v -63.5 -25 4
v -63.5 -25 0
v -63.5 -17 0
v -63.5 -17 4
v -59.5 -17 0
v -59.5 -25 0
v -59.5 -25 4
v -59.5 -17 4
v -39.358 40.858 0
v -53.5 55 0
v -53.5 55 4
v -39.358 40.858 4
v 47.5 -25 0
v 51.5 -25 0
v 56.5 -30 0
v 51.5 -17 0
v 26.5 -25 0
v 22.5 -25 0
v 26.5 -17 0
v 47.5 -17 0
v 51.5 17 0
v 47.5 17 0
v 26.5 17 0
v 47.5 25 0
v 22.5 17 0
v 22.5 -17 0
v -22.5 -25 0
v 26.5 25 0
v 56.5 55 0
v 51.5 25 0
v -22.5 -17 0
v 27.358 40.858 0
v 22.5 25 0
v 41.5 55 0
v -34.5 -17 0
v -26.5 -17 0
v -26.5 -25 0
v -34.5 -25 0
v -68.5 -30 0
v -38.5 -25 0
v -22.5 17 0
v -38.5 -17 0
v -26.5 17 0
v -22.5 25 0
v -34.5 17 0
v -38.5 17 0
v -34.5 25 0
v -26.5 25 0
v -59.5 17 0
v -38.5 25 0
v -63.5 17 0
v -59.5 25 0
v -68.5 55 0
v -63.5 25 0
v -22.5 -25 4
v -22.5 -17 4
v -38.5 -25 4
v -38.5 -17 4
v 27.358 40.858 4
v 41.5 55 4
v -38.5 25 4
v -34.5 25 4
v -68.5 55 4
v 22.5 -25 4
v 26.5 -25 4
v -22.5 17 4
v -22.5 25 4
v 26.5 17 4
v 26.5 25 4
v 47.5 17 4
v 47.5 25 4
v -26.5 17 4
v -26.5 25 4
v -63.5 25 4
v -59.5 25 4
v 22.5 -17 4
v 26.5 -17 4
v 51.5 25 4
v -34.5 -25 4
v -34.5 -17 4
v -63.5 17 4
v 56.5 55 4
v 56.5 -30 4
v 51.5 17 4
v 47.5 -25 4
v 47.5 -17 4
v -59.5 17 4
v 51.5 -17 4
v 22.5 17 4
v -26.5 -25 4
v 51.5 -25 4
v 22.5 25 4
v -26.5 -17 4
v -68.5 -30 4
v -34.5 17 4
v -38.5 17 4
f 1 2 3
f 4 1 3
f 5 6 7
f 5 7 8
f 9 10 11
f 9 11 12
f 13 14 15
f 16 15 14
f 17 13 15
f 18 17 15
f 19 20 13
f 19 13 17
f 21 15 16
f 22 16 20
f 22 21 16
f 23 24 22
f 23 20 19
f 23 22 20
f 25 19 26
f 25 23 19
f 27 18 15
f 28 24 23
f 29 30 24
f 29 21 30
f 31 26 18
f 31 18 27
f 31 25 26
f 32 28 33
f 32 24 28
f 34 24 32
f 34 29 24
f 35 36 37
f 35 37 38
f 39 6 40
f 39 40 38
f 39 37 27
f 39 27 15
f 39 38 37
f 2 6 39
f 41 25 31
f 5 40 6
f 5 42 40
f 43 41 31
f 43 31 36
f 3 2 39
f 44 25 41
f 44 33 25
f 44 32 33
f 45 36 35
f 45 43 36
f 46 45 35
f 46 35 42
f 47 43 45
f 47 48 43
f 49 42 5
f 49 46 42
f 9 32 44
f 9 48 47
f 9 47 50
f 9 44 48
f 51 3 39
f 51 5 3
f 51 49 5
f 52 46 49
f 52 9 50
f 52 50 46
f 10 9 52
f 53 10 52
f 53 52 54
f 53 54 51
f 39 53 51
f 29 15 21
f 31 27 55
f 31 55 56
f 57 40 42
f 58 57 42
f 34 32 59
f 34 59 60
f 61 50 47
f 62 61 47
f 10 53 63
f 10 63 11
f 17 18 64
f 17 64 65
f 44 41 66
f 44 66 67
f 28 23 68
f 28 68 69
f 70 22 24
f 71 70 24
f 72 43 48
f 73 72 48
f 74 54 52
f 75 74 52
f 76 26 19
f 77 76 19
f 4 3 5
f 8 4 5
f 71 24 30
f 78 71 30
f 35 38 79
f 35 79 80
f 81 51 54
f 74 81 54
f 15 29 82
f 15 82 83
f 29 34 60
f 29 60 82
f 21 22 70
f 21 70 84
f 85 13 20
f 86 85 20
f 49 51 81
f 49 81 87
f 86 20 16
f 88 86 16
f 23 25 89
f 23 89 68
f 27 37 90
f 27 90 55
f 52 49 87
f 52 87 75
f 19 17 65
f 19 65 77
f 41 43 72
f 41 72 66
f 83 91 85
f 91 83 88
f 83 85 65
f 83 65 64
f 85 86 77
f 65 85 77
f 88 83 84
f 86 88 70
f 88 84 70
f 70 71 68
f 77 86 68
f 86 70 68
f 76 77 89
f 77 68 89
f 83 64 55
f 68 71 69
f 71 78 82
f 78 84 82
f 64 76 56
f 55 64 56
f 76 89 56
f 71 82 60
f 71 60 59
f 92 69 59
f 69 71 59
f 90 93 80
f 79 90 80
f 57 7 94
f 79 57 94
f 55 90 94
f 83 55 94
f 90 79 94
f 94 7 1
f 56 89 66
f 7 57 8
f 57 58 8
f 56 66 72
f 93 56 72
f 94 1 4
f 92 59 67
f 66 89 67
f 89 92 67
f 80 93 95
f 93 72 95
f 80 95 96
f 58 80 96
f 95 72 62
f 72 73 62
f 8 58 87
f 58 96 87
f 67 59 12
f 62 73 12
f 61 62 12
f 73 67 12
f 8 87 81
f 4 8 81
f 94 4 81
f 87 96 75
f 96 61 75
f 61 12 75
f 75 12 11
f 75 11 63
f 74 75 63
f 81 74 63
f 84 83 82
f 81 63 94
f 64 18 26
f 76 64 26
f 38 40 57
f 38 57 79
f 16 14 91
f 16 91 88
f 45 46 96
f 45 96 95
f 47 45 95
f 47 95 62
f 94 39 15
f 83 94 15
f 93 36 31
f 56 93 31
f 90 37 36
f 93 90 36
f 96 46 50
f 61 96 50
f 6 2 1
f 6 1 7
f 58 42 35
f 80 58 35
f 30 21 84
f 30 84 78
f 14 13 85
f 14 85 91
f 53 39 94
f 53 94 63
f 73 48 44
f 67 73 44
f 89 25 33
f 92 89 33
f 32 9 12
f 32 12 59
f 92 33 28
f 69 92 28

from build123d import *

# Parameters (mm, degrees)
SKETCH1_W           = 125
SKETCH1_H           = 60
SKETCH1_W_2         = 4
SKETCH1_H_2         = 8
BOSS_EXTRUDE1_DEPTH = 4
BOSS_EXTRUDE2_DEPTH = 4


with BuildPart() as part:
    # Sketch1 → Boss-Extrude1 (new body)
    with BuildSketch(Plane.XY):
        with Locations((-6, 0)):
            Rectangle(SKETCH1_W, SKETCH1_H)
        with Locations((-36.5, 21)):
            Rectangle(SKETCH1_W_2, SKETCH1_H_2, mode=Mode.SUBTRACT)
        with Locations((24.5, 21)):
            Rectangle(SKETCH1_W_2, SKETCH1_H_2, mode=Mode.SUBTRACT)
        with Locations((24.5, -21)):
            Rectangle(SKETCH1_W_2, SKETCH1_H_2, mode=Mode.SUBTRACT)
        with Locations((-24.5, 21)):
            Rectangle(SKETCH1_W_2, SKETCH1_H_2, mode=Mode.SUBTRACT)
        with Locations((-24.5, -21)):
            Rectangle(SKETCH1_W_2, SKETCH1_H_2, mode=Mode.SUBTRACT)
        with Locations((49.5, 21)):
            Rectangle(SKETCH1_W_2, SKETCH1_H_2, mode=Mode.SUBTRACT)
        with Locations((49.5, -21)):
            Rectangle(SKETCH1_W_2, SKETCH1_H_2, mode=Mode.SUBTRACT)
        with Locations((-36.5, -21)):
            Rectangle(SKETCH1_W_2, SKETCH1_H_2, mode=Mode.SUBTRACT)
        with Locations((-61.5, 21)):
            Rectangle(SKETCH1_W_2, SKETCH1_H_2, mode=Mode.SUBTRACT)
        with Locations((-61.5, -21)):
            Rectangle(SKETCH1_W_2, SKETCH1_H_2, mode=Mode.SUBTRACT)
    extrude(amount=BOSS_EXTRUDE1_DEPTH)

    # Sketch2 → Boss-Extrude2 (add)
    with BuildSketch(Plane.XY):
        Polygon((-68.5, 30), (-68.5, 55), (-53.5, 55), (-39.357864376, 40.857864376), (27.357864376, 40.857864376), (41.5, 55), (56.5, 55), (56.5, 30), align=None)
    extrude(amount=BOSS_EXTRUDE2_DEPTH)


solid = part.part
